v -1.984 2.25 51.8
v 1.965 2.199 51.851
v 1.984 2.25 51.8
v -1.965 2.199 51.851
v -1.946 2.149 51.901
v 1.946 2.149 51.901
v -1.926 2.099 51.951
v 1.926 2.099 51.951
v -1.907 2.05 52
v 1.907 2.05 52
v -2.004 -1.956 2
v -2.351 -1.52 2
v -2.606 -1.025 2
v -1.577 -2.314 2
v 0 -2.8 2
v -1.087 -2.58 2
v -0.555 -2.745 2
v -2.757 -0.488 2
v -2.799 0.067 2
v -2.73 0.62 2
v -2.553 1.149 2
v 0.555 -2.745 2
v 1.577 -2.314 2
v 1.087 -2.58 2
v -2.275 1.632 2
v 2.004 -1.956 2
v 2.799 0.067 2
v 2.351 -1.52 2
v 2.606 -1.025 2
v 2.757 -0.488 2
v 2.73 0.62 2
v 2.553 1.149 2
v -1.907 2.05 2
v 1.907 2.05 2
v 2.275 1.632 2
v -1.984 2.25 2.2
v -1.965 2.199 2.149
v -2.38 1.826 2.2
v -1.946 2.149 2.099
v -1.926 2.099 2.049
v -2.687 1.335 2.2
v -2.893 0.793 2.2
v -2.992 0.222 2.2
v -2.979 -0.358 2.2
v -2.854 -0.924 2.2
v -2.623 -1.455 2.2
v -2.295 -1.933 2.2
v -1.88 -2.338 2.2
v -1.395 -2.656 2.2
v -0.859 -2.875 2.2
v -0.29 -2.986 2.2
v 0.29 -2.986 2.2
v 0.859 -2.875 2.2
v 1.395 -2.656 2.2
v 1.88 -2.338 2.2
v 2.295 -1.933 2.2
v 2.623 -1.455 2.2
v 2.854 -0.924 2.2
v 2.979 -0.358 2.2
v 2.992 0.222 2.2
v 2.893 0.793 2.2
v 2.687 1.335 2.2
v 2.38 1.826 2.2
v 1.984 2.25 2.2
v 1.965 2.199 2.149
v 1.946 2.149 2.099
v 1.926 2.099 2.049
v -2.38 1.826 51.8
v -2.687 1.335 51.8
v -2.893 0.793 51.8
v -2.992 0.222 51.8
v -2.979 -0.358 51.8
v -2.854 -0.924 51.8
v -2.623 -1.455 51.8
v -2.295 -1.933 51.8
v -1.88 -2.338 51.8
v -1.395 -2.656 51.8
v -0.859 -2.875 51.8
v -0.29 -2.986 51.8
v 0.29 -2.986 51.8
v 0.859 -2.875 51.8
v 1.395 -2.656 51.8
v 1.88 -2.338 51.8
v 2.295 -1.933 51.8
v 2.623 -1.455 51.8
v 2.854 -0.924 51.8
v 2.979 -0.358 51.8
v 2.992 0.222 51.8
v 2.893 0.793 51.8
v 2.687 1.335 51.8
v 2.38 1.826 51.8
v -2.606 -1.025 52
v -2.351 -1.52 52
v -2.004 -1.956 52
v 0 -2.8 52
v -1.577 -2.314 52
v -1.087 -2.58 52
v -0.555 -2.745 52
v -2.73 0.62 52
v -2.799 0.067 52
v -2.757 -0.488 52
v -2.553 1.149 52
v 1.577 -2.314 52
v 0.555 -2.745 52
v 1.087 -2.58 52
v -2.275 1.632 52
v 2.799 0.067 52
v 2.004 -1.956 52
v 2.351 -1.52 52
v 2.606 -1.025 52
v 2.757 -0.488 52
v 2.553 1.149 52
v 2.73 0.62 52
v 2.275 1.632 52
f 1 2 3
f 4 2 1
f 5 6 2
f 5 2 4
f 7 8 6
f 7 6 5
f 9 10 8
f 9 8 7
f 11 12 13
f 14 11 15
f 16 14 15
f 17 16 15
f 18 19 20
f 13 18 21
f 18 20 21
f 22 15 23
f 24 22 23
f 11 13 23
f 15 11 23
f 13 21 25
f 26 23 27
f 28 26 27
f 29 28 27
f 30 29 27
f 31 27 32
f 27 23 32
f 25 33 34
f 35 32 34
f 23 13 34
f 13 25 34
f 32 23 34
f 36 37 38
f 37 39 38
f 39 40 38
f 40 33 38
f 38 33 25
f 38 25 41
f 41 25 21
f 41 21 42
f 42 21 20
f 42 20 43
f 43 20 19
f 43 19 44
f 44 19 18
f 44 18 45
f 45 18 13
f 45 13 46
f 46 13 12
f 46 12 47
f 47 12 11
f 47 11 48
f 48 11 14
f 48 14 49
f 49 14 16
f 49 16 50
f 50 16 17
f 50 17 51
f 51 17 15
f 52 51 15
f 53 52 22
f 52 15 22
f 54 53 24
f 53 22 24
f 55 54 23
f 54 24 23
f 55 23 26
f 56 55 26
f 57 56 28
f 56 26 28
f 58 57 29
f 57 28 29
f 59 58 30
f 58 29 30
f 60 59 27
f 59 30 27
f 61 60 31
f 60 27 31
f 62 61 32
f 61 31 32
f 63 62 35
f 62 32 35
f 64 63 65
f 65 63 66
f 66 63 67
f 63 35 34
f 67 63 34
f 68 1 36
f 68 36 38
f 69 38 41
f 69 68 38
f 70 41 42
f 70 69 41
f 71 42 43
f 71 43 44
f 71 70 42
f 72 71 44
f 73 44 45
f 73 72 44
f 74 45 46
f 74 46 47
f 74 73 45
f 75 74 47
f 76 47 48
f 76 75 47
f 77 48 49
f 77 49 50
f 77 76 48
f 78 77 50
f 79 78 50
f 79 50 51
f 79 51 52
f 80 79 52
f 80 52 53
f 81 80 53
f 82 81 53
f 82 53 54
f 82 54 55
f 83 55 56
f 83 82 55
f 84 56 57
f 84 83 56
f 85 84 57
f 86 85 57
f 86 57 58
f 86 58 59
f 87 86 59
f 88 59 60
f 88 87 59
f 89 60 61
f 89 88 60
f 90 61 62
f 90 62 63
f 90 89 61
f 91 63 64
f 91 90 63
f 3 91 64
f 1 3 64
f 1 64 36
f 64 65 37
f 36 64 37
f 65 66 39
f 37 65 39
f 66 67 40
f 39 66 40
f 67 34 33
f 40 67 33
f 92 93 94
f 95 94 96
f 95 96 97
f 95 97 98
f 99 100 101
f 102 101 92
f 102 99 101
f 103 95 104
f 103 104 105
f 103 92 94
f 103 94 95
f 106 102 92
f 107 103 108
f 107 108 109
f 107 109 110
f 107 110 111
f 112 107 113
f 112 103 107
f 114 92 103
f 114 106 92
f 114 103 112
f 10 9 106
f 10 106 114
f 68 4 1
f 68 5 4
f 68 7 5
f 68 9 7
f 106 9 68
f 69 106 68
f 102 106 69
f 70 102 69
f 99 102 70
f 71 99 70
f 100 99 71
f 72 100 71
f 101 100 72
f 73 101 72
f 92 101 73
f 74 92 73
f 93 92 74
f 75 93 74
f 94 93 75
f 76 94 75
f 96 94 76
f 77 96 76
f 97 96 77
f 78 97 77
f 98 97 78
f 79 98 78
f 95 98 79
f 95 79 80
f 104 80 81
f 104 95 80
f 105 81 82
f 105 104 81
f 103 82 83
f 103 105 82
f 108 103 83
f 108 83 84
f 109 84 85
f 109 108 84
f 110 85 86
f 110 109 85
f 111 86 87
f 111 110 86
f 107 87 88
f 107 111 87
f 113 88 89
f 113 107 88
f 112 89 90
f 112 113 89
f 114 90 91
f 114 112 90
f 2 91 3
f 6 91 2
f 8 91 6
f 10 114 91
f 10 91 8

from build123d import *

# Parameters (mm, degrees)
EXTRUDE_1_DEPTH = 50
CHAMFER_1_SIZE  = 0.2


with BuildPart() as part:
    # 草圖1 → 填料-伸長1 (new body)
    with BuildSketch(Plane.XY.offset(52)):
        with BuildLine():
            Line((1.984313483, 2.25), (-1.984313483, 2.25))
            ThreePointArc((-1.984313483, 2.25), (0, -3), (1.984313483, 2.25))
        make_face()
    extrude(amount=-EXTRUDE_1_DEPTH)

    # 導角1
    chamfer_1_edges = [part.edges().sort_by_distance(p)[0] for p in [
        (0, 2.25, 52),
        (0, -3, 52),
        (0, -3, 2),
        (0, 2.25, 2),
    ]]
    chamfer(chamfer_1_edges, length=CHAMFER_1_SIZE)


solid = part.part
